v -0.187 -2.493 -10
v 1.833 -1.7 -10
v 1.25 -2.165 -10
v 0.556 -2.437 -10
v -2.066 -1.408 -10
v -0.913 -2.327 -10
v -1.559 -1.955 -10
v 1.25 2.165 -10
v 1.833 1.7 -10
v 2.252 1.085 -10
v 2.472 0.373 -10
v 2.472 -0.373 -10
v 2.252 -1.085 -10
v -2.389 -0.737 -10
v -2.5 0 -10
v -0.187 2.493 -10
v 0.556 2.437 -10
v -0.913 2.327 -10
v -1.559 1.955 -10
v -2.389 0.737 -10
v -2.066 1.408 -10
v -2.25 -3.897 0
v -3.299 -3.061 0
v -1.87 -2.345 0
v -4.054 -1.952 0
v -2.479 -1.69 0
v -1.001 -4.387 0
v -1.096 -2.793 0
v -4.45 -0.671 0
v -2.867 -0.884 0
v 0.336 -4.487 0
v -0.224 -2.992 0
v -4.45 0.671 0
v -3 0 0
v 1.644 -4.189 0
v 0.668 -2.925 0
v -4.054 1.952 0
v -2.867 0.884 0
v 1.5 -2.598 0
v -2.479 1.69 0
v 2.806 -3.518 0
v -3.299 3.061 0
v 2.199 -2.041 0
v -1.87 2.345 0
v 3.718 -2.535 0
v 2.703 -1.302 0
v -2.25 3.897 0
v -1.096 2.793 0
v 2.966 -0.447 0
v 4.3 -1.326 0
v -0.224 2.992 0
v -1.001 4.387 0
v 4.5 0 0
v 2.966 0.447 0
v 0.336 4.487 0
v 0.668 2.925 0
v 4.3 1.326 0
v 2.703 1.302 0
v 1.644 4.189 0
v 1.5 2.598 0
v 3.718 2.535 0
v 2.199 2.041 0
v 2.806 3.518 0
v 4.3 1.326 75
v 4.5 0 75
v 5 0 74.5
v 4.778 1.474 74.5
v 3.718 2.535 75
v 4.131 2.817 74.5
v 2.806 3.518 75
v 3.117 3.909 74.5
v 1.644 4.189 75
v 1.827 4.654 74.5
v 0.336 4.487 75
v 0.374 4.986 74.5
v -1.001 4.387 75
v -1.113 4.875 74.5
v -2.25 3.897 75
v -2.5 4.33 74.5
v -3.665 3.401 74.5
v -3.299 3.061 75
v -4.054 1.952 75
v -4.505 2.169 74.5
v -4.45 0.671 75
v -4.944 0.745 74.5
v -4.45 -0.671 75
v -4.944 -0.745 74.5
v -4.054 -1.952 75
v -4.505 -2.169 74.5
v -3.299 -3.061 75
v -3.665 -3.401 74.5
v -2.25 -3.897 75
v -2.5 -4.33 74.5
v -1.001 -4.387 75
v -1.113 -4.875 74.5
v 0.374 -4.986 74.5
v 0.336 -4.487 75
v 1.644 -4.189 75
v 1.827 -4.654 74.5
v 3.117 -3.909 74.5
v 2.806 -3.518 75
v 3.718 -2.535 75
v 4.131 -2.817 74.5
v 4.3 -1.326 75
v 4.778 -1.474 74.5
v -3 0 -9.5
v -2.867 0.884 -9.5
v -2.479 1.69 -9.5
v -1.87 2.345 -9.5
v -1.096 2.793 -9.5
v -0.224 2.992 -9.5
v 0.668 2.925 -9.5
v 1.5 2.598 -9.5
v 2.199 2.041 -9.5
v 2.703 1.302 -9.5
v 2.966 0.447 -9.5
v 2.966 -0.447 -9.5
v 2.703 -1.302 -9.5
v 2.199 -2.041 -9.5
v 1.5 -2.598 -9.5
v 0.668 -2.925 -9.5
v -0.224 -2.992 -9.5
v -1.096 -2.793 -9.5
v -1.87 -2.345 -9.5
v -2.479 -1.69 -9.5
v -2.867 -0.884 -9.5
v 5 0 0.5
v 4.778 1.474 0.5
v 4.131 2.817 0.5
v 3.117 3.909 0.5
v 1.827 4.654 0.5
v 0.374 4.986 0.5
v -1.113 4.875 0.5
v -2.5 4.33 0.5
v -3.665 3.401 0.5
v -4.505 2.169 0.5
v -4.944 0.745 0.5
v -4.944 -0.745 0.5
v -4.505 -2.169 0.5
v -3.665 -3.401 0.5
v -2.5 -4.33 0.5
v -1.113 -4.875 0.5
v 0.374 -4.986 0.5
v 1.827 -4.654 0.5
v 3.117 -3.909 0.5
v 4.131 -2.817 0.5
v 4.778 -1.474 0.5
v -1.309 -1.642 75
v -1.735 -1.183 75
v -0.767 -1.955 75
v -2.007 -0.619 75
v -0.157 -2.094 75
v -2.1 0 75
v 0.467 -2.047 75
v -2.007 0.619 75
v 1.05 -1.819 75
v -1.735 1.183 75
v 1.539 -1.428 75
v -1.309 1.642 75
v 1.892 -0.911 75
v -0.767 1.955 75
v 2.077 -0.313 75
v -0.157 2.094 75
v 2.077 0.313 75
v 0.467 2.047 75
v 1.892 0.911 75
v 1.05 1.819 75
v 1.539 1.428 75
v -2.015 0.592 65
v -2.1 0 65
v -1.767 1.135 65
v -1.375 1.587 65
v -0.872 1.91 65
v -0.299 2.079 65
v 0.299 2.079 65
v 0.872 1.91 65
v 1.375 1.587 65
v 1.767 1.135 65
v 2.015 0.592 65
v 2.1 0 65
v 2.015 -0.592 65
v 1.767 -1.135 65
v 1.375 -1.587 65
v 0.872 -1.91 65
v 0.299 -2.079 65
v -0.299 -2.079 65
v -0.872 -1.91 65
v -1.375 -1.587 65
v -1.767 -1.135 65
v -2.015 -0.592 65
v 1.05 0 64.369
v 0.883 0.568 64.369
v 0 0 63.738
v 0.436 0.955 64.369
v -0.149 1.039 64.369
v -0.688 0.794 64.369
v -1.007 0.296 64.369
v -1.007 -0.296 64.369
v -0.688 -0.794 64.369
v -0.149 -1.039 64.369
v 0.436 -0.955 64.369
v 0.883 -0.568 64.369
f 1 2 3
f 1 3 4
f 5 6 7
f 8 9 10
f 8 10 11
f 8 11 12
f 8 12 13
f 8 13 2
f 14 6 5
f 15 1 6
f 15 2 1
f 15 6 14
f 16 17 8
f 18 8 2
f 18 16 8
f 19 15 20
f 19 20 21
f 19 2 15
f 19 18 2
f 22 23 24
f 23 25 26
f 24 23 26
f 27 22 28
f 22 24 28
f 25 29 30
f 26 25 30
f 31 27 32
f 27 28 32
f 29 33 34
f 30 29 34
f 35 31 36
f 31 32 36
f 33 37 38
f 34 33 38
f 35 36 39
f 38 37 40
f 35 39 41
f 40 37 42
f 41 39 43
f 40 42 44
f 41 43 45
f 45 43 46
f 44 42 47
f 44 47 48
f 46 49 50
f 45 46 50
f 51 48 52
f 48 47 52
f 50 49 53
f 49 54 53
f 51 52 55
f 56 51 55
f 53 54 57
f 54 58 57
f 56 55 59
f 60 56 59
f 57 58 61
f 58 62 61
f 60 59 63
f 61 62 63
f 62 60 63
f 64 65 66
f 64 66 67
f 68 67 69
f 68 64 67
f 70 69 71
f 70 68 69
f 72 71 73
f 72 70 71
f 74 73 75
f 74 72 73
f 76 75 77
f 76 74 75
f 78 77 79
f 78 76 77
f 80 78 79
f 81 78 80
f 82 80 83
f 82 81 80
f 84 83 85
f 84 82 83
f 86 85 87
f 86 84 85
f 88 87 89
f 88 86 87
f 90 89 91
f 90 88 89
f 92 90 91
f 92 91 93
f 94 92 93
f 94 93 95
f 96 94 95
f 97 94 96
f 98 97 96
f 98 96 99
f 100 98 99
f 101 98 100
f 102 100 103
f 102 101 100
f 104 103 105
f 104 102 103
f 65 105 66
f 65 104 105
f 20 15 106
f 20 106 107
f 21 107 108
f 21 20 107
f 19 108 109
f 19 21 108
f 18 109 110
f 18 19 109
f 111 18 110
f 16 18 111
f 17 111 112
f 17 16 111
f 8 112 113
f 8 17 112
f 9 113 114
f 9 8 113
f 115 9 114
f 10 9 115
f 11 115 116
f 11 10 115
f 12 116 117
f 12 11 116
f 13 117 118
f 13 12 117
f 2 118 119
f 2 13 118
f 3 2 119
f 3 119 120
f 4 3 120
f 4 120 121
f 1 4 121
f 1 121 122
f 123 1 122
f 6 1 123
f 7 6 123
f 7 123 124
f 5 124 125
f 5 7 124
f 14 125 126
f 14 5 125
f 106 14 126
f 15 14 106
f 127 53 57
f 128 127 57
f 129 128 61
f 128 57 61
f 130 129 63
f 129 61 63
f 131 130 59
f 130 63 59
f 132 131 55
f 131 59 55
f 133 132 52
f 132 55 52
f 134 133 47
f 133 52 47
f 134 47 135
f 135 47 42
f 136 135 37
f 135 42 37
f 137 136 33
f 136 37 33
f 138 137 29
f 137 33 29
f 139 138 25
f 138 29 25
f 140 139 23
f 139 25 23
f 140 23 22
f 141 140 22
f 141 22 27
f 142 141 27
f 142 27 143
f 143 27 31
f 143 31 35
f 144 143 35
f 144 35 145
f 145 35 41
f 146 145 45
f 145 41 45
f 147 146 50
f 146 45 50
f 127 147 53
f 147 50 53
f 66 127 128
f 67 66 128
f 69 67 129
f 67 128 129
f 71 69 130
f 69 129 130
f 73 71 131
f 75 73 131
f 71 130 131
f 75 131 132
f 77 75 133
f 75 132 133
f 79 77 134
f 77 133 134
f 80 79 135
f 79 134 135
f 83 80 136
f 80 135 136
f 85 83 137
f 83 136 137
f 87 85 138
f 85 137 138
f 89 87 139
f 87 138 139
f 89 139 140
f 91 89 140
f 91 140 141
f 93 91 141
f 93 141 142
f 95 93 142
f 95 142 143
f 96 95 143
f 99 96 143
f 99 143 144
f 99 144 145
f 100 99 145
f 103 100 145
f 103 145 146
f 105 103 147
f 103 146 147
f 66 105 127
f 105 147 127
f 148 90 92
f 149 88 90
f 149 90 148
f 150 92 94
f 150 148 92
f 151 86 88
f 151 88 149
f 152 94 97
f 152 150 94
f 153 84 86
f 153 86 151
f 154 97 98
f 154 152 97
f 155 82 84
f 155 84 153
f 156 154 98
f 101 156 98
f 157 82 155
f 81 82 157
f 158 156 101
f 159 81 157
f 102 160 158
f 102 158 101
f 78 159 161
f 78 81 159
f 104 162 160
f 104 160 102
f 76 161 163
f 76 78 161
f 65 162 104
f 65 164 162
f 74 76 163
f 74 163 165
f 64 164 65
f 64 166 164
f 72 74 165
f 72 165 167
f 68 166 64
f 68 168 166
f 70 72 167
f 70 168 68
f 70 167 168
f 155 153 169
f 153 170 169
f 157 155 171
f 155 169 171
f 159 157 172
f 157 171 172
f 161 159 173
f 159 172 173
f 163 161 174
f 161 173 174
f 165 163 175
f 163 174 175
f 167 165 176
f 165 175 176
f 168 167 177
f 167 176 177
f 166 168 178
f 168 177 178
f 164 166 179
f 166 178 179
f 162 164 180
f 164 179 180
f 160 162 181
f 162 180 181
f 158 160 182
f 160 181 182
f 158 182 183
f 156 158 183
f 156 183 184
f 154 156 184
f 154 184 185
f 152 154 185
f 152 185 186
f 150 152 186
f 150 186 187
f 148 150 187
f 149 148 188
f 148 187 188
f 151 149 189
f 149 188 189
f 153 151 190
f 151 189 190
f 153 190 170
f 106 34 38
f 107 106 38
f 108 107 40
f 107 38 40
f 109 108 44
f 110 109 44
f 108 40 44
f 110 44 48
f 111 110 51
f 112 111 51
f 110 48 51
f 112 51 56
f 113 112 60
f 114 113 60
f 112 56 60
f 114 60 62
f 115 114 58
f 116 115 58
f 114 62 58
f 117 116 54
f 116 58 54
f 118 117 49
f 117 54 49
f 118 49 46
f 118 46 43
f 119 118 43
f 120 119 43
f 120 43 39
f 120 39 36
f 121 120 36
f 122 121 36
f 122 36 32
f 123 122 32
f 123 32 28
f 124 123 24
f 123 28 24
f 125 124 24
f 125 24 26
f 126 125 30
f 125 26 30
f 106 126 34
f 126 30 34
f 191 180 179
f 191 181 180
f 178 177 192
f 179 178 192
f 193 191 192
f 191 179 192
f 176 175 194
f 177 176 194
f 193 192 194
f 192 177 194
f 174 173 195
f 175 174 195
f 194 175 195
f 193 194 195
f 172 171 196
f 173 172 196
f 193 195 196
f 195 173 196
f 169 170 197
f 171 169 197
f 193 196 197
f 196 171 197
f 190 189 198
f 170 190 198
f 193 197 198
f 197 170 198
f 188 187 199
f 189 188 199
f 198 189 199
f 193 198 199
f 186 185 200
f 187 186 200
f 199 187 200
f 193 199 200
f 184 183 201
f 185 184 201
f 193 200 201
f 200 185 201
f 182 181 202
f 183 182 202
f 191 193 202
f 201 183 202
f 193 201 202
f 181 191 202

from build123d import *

# Parameters (mm, degrees)
ESQUISSE1_R                                   = 5
BOSS_EXTRU_1_DEPTH                            = 75
ESQUISSE2_R                                   = 3
BOSS_EXTRU_2_DEPTH                            = 10
TROU_POUR_TARAUDAGE_POUR_TROU_TARAUD_M5_D     = 4.2
TROU_POUR_TARAUDAGE_POUR_TROU_TARAUD_M5_DEPTH = 10
TROU_POUR_TARAUDAGE_POUR_TROU_TARAUD_M5_TIP   = 1.2618073
CHANFREIN1_SIZE                               = 0.5


with BuildPart() as part:
    # Esquisse1 → Boss.-Extru.1 (new body)
    with BuildSketch(Plane.XY):
        Circle(ESQUISSE1_R)
    extrude(amount=BOSS_EXTRU_1_DEPTH)

    # Esquisse2 → Boss.-Extru.2 (add)
    with BuildSketch(Plane(origin=(0, 0, 0), x_dir=(-1, 0, 0), z_dir=(0, 0, -1))):
        Circle(ESQUISSE2_R)
    extrude(amount=BOSS_EXTRU_2_DEPTH)

    # Trou pour taraudage pour trou taraudé M51
    with Locations(Plane.XY.offset(75)):
        with Locations((0, 0)):
            Hole(TROU_POUR_TARAUDAGE_POUR_TROU_TARAUD_M5_D / 2, depth=TROU_POUR_TARAUDAGE_POUR_TROU_TARAUD_M5_DEPTH)
            with Locations((0, 0, -(TROU_POUR_TARAUDAGE_POUR_TROU_TARAUD_M5_DEPTH + TROU_POUR_TARAUDAGE_POUR_TROU_TARAUD_M5_TIP / 2))):  # 118° drill point
                Cone(0, TROU_POUR_TARAUDAGE_POUR_TROU_TARAUD_M5_D / 2, TROU_POUR_TARAUDAGE_POUR_TROU_TARAUD_M5_TIP, mode=Mode.SUBTRACT)

    # Chanfrein1
    chanfrein1_edges = [part.edges().sort_by_distance(p)[0] for p in [
        (-5, 0, 0),
        (-5, 0, 75),
        (3, 0, -10),
    ]]
    chamfer(chanfrein1_edges, length=CHANFREIN1_SIZE)


solid = part.part
